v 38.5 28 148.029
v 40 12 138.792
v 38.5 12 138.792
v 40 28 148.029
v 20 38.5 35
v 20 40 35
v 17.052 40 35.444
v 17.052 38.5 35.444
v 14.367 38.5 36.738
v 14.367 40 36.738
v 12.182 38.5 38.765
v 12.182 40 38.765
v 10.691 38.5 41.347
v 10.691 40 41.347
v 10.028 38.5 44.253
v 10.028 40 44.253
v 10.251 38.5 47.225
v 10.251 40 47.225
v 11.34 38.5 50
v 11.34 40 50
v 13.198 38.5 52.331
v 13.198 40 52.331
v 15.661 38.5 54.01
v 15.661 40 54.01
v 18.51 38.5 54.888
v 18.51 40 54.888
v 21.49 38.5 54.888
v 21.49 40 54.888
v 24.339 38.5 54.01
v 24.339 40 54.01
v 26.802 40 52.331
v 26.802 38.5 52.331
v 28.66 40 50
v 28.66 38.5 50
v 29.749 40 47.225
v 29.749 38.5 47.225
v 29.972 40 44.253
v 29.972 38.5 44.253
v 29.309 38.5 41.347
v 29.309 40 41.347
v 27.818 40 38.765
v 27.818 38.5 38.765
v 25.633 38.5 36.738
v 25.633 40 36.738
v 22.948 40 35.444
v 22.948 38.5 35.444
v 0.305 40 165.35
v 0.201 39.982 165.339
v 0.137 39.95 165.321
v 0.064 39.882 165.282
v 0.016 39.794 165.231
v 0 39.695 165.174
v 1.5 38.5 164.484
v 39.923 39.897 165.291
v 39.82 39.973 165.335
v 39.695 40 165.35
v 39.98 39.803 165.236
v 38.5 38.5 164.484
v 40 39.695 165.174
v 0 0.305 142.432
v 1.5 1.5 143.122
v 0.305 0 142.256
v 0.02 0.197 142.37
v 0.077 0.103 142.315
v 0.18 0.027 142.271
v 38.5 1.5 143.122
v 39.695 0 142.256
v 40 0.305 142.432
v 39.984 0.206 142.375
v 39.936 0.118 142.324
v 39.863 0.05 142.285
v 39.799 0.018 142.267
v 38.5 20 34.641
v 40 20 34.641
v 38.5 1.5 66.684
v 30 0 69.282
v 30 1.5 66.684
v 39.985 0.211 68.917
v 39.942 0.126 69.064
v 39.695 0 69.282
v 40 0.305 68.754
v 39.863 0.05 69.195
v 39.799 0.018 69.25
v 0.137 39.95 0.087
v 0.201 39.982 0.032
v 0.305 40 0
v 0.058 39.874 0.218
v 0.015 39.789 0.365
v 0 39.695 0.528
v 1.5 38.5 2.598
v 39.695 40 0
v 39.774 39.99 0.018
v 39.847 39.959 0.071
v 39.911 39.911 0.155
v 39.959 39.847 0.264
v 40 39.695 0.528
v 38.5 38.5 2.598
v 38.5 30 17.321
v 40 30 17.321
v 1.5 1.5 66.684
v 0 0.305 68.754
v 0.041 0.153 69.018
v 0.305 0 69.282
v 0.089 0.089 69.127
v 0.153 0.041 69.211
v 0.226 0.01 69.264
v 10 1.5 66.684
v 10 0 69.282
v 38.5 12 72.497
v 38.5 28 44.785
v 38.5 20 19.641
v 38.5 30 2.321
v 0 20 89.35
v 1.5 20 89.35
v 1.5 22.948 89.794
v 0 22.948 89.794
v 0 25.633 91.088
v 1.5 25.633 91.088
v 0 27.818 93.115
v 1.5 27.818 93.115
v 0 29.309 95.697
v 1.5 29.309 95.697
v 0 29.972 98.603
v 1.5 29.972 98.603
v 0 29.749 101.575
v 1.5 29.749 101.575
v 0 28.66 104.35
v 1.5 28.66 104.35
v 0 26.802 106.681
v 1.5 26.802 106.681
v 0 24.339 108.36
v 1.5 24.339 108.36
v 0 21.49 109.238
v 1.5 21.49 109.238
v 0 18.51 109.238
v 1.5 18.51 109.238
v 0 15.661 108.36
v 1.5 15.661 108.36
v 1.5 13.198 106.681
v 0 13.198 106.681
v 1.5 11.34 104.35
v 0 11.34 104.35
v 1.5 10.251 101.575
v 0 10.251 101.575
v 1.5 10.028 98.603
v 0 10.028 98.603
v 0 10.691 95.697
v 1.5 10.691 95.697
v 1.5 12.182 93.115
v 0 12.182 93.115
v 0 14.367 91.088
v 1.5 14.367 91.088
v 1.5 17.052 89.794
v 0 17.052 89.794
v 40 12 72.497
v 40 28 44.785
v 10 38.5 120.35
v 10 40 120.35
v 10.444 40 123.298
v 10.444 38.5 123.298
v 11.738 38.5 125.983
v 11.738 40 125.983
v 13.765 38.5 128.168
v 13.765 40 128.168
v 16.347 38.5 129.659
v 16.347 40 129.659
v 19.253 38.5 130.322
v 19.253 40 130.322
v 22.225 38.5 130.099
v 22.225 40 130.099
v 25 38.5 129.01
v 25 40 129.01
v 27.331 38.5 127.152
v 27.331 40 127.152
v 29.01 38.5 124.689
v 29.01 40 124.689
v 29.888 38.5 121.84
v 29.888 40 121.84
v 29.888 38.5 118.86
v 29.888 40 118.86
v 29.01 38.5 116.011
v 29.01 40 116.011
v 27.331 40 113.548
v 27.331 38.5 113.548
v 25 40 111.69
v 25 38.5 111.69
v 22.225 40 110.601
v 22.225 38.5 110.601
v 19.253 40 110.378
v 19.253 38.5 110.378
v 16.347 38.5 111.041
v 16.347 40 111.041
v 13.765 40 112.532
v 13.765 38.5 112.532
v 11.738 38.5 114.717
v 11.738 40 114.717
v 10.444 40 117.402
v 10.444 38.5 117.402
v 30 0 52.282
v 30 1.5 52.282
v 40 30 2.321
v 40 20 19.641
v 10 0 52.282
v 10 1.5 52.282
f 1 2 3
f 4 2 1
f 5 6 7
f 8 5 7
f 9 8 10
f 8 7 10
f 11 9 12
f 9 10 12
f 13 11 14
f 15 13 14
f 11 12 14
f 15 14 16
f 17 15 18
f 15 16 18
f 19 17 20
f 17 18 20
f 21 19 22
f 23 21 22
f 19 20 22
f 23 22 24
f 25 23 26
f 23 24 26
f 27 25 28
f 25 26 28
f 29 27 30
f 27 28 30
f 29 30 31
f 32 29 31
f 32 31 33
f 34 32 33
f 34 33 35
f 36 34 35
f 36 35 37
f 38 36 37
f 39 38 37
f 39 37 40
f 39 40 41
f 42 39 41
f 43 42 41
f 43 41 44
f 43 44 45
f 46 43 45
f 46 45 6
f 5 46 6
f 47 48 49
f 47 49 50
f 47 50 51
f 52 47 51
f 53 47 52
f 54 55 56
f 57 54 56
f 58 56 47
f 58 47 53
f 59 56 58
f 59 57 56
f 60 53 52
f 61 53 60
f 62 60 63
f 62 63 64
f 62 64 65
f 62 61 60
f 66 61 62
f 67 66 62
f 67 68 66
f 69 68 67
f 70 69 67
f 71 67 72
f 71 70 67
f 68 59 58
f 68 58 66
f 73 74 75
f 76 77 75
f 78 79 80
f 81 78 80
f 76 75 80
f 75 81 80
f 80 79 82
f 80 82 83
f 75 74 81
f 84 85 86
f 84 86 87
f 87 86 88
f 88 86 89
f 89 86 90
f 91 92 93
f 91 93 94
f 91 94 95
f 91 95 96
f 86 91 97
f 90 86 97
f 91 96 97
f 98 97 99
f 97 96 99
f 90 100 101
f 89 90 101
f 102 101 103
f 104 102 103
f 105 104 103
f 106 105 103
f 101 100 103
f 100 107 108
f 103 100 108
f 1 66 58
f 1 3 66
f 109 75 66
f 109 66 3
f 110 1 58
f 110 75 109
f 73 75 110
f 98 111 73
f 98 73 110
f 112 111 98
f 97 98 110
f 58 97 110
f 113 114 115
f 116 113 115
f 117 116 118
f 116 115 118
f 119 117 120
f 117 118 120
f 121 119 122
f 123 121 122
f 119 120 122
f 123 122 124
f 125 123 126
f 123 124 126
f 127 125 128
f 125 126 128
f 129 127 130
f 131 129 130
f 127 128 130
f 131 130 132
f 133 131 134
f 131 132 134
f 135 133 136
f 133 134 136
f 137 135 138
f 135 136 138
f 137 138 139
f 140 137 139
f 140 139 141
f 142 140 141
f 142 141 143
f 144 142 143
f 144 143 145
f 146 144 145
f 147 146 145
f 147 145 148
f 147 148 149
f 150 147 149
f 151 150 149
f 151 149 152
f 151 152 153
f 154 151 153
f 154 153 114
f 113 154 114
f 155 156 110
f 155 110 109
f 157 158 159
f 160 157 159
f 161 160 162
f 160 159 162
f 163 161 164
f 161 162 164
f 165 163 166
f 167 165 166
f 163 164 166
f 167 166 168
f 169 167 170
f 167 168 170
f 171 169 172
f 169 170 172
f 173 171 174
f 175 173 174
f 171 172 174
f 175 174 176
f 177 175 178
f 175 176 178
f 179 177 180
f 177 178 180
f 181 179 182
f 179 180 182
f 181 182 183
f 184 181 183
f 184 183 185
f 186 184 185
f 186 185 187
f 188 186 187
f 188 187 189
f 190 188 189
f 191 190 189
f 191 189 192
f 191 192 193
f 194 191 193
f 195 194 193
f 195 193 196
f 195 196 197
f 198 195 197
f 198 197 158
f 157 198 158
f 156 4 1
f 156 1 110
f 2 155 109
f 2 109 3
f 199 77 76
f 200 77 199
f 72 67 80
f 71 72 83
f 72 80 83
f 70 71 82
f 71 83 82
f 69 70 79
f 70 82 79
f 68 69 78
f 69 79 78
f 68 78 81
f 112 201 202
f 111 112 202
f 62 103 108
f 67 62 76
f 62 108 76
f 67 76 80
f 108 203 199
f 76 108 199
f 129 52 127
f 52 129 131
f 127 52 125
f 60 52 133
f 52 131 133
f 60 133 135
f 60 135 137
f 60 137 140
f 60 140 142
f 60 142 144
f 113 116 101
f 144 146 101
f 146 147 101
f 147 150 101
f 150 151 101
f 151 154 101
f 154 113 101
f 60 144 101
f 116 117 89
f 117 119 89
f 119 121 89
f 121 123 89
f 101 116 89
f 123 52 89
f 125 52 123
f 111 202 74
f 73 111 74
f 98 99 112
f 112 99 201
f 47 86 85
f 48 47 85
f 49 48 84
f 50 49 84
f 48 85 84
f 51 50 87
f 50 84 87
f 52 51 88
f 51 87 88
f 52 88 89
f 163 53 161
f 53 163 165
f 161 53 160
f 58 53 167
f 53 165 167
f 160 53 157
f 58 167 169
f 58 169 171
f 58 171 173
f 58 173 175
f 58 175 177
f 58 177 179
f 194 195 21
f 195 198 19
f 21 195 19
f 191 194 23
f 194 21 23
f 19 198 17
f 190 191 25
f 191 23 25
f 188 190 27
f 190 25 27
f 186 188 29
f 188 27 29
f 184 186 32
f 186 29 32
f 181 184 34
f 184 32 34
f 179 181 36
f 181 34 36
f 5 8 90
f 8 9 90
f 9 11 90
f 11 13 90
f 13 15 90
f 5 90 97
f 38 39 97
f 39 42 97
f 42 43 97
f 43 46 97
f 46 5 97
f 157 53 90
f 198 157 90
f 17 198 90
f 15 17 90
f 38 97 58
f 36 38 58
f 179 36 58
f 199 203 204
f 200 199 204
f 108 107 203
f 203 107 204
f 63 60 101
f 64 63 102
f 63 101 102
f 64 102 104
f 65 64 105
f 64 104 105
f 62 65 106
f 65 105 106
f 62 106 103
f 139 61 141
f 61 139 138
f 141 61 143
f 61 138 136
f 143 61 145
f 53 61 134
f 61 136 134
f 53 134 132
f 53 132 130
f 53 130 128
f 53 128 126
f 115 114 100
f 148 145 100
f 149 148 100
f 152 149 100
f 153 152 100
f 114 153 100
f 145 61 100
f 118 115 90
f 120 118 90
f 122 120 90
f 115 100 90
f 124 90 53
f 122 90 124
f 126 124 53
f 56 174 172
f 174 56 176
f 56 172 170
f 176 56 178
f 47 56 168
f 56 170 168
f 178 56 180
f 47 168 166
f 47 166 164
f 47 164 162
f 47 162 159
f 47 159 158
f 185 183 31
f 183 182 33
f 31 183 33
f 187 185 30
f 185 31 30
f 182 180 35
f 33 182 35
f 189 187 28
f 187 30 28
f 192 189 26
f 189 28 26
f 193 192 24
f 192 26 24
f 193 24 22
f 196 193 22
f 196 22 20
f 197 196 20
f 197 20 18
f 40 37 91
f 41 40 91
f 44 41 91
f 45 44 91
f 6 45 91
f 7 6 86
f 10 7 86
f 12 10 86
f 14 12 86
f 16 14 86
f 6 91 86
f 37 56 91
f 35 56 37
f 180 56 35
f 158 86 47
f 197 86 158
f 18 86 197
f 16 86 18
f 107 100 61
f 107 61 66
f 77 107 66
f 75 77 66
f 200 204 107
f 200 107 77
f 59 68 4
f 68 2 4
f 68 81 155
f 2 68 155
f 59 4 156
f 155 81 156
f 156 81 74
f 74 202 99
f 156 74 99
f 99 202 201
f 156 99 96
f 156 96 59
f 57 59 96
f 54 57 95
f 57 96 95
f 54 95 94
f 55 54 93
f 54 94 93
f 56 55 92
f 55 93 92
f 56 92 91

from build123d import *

# Parameters (mm, degrees)
SKETCH1_W           = 37
SKETCH1_H           = 37
BOSS_EXTRUDE1_DEPTH = 165.35
CUT_EXTRUDE1_DEPTH  = 50
BOSS_EXTRUDE2_START = -10
BOSS_EXTRUDE2_DEPTH = 20
BOSS_EXTRUDE3_START = -40
BOSS_EXTRUDE3_DEPTH = 1.5
CUT_EXTRUDE2_DEPTH  = 10
SKETCH6_R           = 10
CUT_EXTRUDE3_DEPTH  = 10
SKETCH7_R           = 10
CUT_EXTRUDE4_DEPTH  = 10


with BuildPart() as part:
    # Sketch1 → Boss-Extrude1 (new body)
    with BuildSketch(Plane.XY):
        with BuildLine():
            Line((0.305025041, 0), (39.694974959, 0))
            ThreePointArc((39.694974959, 0), (39.910660234, 0.089339766), (40, 0.305025041))
            Line((40, 0.305025041), (40, 39.694974959))
            ThreePointArc((40, 39.694974959), (39.910660234, 39.910660234), (39.694974959, 40))
            Line((39.694974959, 40), (0.305025041, 40))
            ThreePointArc((0.305025041, 40), (0.089339766, 39.910660234), (0, 39.694974959))
            Line((0, 39.694974959), (0, 0.305025041))
            ThreePointArc((0, 0.305025041), (0.089339766, 0.089339766), (0.305025041, 0))
        make_face()
        with Locations((20, 20)):
            Rectangle(SKETCH1_W, SKETCH1_H, mode=Mode.SUBTRACT)
    extrude(amount=BOSS_EXTRUDE1_DEPTH)

    # Sketch2 → Cut-Extrude1 (cut)
    with BuildSketch(Plane(origin=(40, 0, 0), x_dir=(0, 0, -1), z_dir=(1, 0, 0))):
        Polygon((0, 40), (-69.282032303, 0), (0, 0), align=None)
        Polygon((-165.35, 40), (-142.255989232, 0), (-165.35, 0), align=None)
    extrude(amount=-CUT_EXTRUDE1_DEPTH, mode=Mode.SUBTRACT)

    # Sketch3 → Boss-Extrude2 (add)
    with BuildSketch(Plane.ZY.offset(BOSS_EXTRUDE2_START)):
        Polygon((69.282032303, 0), (52.282032303, 0), (52.282032303, 1.5), (66.683956091, 1.5), align=None)
    extrude(amount=-BOSS_EXTRUDE2_DEPTH)

    # Sketch4 → Boss-Extrude3 (add)
    with BuildSketch(Plane.ZY.offset(BOSS_EXTRUDE3_START)):
        Polygon((2.320508076, 30), (19.641016151, 20), (34.641016151, 20), (17.320508076, 30), align=None)
    extrude(amount=BOSS_EXTRUDE3_DEPTH)

    # Sketch5 → Cut-Extrude2 (cut)
    with BuildSketch(Plane(origin=(40, 0, 0), x_dir=(0, 0, -1), z_dir=(1, 0, 0))):
        Polygon((-44.784609691, 28), (-72.497422612, 12), (-138.791887617, 12), (-148.029491924, 28), align=None)
    extrude(amount=-CUT_EXTRUDE2_DEPTH, mode=Mode.SUBTRACT)

    # Sketch6 → Cut-Extrude3 (cut)
    with BuildSketch(Plane(origin=(0, 40, 0), x_dir=(1, 0, 0), z_dir=(0, 1, 0))):
        with Locations(Location((20, -120.35, 0), (0, 0, 180))):
            Circle(SKETCH6_R)
        with Locations(Location((20, -45, 0), (0, 0, 90))):
            Circle(SKETCH6_R)
    extrude(amount=-CUT_EXTRUDE3_DEPTH, mode=Mode.SUBTRACT)

    # Sketch7 → Cut-Extrude4 (cut)
    with BuildSketch(Plane(origin=(1.5, 0, 0), x_dir=(0, 0, -1), z_dir=(1, 0, 0))):
        with Locations((-99.35, 20)):
            Circle(SKETCH7_R)
    extrude(amount=-CUT_EXTRUDE4_DEPTH, mode=Mode.SUBTRACT)


solid = part.part
